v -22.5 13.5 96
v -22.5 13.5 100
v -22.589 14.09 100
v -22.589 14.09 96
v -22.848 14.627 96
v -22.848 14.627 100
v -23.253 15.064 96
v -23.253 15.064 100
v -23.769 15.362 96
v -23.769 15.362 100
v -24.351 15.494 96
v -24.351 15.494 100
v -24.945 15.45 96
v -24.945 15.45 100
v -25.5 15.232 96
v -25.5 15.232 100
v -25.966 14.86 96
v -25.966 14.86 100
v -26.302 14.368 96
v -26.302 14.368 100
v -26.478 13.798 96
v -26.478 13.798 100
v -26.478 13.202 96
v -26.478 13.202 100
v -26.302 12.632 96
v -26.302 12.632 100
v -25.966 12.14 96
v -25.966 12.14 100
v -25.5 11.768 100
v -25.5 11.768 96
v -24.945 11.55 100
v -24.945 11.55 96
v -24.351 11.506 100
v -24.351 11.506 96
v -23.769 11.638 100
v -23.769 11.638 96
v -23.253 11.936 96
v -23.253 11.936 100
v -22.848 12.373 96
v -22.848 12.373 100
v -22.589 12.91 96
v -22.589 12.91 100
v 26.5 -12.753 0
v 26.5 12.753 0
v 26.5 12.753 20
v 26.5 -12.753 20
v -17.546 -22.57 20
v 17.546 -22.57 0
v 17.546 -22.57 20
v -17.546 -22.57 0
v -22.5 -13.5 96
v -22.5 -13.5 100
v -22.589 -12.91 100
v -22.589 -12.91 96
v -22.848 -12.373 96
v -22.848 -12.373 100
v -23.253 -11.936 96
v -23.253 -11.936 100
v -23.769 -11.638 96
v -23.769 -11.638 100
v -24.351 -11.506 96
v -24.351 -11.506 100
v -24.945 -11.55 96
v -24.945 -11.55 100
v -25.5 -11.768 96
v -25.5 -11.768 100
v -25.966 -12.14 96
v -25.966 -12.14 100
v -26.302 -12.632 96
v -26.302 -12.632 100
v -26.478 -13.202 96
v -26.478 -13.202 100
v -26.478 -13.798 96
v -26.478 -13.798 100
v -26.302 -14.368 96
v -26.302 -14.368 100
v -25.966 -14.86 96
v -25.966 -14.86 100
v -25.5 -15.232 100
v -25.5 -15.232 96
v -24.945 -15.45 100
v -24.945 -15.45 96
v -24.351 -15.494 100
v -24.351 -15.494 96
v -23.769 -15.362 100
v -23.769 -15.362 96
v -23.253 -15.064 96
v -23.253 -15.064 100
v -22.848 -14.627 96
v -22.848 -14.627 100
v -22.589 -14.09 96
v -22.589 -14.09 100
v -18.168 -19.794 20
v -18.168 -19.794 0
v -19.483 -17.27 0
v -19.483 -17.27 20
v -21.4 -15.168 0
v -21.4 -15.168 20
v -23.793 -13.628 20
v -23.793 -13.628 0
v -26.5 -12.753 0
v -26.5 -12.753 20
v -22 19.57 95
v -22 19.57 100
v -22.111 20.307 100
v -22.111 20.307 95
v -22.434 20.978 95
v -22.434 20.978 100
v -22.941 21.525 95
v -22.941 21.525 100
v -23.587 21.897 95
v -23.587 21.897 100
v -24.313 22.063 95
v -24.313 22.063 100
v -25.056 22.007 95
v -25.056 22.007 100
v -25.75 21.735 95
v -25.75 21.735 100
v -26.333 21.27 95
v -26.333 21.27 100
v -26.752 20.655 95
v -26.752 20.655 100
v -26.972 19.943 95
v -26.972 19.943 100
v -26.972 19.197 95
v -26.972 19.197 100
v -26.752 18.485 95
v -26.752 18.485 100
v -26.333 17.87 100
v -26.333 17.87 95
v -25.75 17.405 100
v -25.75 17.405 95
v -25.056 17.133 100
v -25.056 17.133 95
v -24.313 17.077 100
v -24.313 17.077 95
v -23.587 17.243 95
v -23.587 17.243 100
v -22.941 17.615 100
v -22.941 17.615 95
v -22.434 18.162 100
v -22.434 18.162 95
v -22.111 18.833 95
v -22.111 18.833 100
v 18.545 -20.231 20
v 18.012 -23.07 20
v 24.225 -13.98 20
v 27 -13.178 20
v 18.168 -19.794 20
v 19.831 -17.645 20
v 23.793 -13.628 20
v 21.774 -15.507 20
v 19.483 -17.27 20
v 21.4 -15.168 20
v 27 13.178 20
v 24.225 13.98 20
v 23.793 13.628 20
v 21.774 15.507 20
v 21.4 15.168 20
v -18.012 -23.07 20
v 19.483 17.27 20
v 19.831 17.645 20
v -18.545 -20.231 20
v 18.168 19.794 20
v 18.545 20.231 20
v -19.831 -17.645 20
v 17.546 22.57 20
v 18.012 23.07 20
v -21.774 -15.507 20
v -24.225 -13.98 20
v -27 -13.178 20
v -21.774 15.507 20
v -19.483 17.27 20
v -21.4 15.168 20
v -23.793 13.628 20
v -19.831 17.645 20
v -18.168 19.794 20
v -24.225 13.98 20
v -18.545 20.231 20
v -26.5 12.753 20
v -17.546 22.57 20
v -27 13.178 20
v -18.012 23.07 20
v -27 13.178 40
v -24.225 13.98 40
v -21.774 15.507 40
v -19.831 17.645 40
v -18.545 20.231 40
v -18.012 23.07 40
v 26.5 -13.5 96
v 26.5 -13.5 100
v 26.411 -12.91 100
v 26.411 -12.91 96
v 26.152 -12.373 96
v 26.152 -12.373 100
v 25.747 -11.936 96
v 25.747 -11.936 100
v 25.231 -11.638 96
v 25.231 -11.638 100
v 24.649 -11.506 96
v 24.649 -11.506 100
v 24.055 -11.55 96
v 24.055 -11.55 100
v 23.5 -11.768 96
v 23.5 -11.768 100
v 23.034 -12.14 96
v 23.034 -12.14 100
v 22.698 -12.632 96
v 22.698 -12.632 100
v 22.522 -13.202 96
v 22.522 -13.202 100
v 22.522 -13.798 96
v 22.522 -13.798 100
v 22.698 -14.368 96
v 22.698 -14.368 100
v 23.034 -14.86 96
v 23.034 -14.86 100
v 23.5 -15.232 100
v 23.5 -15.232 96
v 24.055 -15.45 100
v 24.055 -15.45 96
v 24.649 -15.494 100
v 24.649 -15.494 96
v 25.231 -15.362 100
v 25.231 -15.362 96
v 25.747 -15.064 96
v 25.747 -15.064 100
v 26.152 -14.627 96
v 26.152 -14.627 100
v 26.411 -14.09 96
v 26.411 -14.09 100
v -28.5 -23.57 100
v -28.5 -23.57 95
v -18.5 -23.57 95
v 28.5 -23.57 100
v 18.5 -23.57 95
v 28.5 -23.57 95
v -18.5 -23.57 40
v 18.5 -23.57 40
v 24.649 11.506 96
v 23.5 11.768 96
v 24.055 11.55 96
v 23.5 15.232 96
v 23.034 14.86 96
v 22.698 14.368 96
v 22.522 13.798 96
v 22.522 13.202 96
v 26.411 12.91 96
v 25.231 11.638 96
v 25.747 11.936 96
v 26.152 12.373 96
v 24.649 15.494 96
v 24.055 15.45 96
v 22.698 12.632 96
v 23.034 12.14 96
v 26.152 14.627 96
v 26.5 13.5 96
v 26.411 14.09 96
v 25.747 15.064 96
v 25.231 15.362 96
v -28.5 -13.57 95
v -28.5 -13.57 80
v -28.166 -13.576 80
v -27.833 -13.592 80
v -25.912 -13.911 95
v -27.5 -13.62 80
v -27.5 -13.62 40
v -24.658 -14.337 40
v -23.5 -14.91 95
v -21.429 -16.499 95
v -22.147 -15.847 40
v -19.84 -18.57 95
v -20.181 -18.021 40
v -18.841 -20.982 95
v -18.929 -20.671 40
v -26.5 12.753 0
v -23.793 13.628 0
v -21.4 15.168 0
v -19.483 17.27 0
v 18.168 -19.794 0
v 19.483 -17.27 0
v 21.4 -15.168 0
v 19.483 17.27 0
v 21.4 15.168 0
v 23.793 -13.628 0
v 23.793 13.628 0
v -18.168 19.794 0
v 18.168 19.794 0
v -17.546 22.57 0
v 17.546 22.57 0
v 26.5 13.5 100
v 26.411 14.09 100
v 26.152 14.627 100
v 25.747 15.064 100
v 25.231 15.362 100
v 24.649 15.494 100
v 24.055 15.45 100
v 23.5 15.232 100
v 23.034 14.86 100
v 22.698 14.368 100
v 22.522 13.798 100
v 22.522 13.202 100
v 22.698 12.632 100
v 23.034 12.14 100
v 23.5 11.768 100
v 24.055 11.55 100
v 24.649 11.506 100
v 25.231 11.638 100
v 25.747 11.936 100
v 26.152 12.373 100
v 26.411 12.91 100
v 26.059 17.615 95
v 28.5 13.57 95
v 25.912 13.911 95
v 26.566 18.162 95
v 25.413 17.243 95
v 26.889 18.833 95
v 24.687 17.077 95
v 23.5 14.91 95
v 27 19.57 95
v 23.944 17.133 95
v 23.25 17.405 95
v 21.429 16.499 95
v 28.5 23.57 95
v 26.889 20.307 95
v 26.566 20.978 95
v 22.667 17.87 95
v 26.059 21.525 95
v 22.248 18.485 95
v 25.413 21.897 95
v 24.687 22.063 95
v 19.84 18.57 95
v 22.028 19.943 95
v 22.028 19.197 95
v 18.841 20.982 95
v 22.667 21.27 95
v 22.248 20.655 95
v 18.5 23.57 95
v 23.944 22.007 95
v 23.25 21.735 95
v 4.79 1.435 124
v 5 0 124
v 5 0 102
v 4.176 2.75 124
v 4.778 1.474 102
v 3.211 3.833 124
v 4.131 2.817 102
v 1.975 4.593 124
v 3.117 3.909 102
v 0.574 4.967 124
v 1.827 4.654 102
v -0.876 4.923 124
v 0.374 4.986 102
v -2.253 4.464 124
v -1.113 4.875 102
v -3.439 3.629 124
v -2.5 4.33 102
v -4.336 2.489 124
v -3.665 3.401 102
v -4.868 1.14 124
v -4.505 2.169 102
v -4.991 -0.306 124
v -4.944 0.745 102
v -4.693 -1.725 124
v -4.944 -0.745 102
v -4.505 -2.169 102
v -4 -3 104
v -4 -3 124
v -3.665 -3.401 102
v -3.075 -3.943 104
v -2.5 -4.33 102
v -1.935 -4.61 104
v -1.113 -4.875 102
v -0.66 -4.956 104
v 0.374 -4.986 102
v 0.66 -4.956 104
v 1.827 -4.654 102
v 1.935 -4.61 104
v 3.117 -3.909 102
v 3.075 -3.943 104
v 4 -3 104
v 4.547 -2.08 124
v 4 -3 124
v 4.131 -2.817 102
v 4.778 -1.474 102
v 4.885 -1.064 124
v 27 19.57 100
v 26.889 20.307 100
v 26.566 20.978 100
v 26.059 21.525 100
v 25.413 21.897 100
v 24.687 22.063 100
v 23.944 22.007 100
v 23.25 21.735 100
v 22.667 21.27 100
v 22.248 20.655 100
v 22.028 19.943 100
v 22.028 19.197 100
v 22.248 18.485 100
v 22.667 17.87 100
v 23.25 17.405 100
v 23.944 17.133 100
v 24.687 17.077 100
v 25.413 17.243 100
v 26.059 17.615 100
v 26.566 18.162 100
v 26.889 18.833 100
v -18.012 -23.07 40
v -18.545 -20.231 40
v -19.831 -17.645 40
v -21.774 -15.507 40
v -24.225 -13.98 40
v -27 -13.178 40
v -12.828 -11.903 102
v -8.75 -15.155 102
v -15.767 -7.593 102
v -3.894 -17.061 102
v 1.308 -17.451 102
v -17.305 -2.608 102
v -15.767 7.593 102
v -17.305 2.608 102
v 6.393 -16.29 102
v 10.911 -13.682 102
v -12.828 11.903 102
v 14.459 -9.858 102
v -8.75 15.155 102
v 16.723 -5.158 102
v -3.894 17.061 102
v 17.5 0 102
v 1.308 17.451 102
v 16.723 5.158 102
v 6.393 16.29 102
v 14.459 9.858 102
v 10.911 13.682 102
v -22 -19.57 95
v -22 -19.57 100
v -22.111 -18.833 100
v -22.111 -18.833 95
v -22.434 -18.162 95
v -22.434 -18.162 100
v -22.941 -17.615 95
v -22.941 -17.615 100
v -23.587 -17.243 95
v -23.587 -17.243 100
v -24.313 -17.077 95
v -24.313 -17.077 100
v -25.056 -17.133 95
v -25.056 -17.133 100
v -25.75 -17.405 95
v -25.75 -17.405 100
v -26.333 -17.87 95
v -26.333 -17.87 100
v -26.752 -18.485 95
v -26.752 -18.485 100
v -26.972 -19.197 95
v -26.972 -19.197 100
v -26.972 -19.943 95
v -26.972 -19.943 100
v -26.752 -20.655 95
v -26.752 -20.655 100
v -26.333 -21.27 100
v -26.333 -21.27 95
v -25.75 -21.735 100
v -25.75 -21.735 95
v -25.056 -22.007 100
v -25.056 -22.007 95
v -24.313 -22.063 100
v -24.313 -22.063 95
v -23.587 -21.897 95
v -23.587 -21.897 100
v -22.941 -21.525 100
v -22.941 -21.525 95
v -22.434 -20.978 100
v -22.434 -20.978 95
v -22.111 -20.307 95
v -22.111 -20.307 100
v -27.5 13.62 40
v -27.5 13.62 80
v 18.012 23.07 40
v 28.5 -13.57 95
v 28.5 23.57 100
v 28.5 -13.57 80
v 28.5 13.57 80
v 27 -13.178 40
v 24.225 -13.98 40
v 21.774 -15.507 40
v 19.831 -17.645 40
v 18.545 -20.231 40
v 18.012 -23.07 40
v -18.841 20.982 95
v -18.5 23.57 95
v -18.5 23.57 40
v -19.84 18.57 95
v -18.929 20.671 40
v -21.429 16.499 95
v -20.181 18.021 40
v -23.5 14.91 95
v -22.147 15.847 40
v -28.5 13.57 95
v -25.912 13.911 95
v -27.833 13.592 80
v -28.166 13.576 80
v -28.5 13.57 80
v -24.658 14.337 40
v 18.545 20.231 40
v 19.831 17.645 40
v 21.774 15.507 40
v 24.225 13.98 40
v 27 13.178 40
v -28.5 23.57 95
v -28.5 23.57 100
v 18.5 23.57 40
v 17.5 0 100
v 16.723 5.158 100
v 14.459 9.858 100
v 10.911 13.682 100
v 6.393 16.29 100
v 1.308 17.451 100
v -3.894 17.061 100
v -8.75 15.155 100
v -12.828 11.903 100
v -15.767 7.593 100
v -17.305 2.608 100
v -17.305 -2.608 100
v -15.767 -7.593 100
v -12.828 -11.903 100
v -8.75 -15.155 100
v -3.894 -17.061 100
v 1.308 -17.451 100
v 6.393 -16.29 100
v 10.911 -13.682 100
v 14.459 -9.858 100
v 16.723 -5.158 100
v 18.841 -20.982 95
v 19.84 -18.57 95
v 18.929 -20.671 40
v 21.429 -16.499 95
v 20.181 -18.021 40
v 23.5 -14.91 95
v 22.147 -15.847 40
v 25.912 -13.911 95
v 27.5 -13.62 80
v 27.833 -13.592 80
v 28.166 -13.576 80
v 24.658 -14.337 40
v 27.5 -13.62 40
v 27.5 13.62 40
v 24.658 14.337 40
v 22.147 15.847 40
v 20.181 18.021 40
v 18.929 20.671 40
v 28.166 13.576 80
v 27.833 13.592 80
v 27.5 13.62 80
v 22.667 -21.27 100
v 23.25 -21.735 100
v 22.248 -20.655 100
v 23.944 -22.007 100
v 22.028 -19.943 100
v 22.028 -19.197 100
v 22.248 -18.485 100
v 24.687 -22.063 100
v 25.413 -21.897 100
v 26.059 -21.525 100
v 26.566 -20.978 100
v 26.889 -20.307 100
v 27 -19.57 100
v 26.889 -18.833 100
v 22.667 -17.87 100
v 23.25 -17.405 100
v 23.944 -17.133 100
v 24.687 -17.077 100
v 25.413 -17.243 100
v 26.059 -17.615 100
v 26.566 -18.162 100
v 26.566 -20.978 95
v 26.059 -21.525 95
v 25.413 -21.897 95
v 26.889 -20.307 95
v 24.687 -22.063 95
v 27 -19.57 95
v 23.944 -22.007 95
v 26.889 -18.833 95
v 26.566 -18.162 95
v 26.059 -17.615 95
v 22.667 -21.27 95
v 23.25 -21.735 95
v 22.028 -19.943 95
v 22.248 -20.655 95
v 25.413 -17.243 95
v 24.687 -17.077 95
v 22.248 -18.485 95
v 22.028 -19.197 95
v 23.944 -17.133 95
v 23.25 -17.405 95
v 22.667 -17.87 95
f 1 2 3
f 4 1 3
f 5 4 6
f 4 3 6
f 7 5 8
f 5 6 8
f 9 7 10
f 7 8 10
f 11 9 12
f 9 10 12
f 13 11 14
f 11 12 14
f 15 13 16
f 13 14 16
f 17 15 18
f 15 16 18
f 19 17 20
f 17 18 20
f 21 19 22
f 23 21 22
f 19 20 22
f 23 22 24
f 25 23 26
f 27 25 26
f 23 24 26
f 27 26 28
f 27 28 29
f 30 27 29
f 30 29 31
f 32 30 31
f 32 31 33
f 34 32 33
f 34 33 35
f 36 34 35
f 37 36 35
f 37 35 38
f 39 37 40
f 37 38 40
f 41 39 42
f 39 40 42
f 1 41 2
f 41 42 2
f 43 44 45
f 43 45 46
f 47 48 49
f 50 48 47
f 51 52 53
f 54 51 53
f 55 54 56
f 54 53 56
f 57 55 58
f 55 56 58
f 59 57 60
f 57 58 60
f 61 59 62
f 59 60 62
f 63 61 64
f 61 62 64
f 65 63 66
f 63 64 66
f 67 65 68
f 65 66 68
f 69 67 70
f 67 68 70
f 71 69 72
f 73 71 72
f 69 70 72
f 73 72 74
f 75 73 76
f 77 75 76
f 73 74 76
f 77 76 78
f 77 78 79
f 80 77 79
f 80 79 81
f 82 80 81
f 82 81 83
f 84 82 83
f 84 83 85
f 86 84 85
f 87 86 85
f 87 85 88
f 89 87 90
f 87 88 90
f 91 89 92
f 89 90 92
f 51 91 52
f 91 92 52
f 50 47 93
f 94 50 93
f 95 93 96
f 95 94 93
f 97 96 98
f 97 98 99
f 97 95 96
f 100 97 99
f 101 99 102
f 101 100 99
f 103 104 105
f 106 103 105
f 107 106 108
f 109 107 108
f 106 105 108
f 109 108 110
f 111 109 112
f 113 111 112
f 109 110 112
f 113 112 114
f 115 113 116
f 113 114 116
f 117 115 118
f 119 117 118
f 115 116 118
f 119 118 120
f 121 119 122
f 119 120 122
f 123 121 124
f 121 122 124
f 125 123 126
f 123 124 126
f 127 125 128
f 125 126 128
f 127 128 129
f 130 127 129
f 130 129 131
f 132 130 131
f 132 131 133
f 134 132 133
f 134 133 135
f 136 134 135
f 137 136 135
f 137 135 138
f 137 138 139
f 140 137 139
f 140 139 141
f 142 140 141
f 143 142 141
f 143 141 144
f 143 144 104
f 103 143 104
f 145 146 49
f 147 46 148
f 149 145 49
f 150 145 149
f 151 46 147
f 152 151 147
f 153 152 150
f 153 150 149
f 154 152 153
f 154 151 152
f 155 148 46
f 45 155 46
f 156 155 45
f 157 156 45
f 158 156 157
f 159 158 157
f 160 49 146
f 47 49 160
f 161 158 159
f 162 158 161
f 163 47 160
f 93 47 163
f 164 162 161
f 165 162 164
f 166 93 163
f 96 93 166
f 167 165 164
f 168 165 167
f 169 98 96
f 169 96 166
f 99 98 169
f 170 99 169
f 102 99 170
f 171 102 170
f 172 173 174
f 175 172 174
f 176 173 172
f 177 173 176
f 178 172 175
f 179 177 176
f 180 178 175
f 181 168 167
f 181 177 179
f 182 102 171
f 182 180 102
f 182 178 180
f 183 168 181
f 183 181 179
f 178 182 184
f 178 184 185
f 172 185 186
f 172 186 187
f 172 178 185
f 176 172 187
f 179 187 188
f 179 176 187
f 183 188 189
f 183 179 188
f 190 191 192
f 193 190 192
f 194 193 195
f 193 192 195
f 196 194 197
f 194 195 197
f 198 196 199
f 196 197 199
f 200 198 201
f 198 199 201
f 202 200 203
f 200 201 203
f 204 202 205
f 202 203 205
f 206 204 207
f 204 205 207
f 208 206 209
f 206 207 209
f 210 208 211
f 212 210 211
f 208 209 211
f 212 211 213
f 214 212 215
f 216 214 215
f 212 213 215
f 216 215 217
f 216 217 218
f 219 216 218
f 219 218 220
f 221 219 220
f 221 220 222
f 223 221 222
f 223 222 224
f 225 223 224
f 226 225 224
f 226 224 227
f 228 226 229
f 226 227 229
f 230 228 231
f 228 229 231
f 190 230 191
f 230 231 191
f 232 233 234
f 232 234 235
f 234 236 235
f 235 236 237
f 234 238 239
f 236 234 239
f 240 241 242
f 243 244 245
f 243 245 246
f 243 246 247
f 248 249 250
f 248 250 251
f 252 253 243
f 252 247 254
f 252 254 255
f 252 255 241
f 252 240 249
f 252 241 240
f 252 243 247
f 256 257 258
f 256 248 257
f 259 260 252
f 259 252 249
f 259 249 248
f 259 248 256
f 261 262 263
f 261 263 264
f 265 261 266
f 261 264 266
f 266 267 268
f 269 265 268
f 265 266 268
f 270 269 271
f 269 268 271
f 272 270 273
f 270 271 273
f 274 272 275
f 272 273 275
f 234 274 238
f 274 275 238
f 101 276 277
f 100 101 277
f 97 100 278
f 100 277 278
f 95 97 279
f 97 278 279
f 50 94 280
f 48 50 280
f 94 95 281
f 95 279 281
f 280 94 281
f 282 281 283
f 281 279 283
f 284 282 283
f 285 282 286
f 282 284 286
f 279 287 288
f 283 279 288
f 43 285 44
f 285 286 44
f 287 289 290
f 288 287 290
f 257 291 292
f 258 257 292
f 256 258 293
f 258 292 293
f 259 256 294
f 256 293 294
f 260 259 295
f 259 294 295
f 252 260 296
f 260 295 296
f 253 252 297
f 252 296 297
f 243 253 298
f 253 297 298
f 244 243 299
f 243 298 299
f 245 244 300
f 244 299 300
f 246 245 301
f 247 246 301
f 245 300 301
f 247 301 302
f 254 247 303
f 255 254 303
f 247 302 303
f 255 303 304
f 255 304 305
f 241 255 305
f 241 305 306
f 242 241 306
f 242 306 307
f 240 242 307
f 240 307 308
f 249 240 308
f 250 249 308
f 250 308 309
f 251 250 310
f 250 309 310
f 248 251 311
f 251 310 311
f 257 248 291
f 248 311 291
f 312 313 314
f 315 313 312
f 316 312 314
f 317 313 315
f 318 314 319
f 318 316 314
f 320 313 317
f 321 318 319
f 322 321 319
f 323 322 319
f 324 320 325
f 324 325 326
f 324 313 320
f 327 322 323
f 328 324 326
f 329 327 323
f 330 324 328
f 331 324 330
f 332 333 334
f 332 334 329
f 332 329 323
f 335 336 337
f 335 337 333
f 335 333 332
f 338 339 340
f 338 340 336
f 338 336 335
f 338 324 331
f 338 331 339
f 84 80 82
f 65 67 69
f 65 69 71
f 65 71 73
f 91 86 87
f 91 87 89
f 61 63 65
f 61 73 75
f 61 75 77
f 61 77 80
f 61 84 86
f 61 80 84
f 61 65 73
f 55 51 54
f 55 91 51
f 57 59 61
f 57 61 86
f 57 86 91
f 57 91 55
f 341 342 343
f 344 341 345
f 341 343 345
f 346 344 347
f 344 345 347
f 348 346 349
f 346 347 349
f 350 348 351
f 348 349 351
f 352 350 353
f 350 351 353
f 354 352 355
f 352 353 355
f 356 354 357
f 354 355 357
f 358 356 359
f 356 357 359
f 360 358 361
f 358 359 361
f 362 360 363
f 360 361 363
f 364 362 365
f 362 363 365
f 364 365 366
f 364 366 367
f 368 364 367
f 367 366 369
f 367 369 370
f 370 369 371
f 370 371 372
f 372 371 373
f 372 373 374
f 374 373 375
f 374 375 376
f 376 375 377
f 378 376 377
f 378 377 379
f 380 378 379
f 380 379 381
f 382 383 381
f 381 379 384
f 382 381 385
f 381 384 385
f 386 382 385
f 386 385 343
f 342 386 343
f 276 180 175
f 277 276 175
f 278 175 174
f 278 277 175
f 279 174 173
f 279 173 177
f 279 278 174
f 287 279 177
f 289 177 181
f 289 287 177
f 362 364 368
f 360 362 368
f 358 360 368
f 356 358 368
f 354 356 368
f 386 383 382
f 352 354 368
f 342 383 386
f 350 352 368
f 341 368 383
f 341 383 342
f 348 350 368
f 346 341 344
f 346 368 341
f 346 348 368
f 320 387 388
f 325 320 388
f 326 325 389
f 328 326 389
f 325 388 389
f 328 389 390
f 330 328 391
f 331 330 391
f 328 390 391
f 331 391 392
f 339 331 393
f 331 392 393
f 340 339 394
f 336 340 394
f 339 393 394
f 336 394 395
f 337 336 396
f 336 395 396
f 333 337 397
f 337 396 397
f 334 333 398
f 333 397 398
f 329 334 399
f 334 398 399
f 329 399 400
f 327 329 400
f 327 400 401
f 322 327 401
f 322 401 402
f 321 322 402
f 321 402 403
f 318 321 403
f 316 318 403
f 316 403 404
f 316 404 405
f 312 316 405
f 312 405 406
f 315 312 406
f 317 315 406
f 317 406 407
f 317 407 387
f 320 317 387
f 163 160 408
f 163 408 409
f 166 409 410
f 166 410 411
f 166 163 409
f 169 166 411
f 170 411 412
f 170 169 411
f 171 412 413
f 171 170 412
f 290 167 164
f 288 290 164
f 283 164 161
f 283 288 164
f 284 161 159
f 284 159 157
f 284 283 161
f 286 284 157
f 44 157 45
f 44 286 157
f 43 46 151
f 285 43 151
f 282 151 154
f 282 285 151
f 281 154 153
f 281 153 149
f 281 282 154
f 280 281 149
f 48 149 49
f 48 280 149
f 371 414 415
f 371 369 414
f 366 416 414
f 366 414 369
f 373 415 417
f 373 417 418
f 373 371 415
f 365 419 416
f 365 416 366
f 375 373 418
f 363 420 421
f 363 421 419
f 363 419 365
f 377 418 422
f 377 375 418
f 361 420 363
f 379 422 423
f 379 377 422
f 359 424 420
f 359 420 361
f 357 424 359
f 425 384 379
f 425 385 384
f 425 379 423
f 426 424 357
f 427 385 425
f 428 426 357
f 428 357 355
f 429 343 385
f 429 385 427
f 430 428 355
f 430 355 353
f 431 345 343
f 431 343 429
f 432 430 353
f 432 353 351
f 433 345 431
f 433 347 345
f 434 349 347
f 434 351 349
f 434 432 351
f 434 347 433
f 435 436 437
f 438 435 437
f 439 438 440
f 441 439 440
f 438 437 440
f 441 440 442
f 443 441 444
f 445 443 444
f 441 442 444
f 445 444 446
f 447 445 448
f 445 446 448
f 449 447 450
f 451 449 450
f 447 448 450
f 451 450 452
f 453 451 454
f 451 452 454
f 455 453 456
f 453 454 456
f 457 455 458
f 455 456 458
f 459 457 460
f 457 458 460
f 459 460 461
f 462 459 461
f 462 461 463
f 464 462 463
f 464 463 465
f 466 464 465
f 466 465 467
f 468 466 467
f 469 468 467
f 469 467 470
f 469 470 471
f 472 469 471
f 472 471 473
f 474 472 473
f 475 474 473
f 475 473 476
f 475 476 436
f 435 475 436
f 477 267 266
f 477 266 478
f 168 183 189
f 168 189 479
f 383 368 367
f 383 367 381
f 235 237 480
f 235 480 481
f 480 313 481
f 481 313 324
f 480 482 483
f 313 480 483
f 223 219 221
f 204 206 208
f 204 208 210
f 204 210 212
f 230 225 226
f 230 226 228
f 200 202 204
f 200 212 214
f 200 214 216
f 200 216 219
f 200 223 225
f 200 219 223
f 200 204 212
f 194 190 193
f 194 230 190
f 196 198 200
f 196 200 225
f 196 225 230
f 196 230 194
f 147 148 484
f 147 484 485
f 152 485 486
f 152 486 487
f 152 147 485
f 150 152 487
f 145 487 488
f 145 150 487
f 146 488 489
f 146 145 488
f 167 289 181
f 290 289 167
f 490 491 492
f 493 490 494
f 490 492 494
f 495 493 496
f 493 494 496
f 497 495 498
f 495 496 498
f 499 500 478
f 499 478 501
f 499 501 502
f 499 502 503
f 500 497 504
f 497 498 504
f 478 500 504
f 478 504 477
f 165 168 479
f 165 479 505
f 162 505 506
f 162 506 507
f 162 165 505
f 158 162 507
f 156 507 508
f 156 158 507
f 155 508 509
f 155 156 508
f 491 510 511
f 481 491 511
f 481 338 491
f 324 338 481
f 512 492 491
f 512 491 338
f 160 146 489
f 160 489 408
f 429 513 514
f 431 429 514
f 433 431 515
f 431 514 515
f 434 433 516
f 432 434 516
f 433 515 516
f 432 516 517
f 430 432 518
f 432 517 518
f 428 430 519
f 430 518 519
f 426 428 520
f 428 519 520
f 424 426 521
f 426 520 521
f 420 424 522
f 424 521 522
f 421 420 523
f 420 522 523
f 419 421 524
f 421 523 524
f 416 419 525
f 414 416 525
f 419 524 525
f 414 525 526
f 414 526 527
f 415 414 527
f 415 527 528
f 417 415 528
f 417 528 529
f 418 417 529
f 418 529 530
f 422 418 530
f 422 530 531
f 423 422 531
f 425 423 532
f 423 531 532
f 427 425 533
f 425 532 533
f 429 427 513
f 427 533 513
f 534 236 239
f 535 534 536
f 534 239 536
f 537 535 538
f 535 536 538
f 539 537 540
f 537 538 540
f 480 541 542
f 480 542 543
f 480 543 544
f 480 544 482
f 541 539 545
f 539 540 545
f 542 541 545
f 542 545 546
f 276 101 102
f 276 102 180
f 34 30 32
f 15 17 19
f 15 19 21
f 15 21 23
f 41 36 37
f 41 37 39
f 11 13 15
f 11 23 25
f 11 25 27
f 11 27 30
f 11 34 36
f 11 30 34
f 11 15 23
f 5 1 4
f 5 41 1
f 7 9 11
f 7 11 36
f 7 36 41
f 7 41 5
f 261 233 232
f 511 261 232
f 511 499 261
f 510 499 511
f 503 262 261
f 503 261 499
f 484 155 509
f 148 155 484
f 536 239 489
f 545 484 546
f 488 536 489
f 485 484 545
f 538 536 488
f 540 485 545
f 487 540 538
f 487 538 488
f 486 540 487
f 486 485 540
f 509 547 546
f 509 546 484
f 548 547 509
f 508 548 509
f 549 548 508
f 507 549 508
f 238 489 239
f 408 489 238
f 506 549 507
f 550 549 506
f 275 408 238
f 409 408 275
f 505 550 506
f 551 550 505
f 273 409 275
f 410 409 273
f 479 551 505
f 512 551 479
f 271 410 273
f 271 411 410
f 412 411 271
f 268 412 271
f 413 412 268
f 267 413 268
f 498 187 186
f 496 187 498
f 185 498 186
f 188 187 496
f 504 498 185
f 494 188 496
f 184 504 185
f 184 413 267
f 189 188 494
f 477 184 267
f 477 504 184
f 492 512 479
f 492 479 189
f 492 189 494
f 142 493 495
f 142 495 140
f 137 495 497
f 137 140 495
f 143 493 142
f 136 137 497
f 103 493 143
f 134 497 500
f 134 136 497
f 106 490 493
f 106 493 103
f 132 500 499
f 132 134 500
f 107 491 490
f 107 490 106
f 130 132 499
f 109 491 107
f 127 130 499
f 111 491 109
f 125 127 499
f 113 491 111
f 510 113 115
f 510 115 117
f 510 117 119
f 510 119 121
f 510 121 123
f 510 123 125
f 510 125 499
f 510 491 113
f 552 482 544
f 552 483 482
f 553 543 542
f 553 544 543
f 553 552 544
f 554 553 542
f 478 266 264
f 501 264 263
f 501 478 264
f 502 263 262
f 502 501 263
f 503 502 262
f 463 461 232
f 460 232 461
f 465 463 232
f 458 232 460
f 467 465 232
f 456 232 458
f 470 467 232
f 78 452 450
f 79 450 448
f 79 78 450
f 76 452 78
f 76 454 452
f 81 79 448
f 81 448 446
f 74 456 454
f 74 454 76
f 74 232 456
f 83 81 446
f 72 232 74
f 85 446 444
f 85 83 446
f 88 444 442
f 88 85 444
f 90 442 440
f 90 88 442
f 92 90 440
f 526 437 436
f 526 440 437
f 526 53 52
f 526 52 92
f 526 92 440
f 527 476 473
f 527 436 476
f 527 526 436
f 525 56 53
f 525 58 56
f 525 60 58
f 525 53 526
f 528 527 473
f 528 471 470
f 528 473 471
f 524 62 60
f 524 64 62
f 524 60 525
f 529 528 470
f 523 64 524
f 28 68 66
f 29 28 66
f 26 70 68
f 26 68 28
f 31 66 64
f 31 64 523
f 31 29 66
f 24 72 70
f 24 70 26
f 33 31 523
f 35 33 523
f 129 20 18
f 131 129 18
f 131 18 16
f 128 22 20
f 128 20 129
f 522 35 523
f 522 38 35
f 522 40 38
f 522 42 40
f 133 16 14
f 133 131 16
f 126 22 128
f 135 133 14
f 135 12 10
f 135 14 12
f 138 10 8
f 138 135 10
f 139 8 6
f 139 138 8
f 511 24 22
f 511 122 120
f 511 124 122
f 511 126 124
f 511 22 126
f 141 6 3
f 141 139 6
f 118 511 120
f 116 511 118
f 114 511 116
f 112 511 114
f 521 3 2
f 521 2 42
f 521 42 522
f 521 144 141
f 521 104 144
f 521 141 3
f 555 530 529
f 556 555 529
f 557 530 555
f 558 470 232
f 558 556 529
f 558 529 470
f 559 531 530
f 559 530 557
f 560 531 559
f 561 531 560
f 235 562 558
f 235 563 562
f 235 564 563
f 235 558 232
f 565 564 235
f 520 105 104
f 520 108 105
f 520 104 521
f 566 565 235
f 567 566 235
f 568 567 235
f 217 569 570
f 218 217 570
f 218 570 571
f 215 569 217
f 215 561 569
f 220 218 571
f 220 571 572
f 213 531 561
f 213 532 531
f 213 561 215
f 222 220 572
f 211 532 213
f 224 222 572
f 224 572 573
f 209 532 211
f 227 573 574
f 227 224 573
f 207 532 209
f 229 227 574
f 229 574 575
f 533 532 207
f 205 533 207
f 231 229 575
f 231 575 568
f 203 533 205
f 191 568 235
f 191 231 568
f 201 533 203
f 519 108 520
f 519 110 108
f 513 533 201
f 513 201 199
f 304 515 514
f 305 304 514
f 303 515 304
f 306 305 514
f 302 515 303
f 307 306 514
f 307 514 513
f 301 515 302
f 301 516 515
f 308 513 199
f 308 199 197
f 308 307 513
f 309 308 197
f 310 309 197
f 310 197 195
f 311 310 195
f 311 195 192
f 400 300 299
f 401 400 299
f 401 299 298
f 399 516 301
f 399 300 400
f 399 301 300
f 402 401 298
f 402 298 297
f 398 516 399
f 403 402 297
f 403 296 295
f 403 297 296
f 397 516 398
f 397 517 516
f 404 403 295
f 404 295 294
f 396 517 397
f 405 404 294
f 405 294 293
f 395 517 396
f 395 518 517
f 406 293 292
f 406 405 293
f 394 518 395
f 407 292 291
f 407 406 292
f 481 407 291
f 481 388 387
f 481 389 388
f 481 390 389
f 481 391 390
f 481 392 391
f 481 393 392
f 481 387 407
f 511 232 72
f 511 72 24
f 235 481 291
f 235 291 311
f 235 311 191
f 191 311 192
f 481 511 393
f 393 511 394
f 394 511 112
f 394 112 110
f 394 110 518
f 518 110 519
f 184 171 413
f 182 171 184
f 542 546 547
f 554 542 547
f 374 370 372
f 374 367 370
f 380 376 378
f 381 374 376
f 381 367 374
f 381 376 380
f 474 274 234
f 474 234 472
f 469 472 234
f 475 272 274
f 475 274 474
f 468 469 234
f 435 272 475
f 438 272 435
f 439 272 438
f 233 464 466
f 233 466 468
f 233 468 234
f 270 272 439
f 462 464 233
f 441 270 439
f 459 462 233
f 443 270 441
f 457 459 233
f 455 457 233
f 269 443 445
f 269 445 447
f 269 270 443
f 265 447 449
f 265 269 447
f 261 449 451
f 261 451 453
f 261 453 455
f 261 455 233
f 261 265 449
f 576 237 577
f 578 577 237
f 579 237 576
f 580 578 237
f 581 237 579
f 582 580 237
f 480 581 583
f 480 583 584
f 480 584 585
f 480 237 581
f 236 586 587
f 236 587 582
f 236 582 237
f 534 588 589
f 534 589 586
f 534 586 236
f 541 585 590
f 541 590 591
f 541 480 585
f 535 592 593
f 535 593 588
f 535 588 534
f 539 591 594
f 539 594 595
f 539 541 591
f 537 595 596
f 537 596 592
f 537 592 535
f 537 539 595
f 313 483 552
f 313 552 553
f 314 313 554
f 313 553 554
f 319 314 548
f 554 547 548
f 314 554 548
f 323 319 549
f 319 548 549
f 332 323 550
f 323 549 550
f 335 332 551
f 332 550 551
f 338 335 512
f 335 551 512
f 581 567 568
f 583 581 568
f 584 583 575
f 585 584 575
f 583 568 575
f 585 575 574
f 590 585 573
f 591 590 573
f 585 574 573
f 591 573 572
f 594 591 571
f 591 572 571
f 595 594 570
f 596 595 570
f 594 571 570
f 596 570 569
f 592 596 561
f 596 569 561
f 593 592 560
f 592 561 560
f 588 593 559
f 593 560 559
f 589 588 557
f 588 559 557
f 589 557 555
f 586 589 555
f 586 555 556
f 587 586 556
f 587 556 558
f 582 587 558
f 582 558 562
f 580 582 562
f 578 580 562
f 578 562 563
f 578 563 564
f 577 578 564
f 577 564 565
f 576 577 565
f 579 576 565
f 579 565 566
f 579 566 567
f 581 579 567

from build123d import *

# Parameters (mm, degrees)
SKETCH_2_W           = 57
SKETCH_2_H           = 47.14
EXTRUDE_1_DEPTH      = 100
SKETCH_3_R           = 17.5
EXTRUDE_2_DEPTH      = 2
SKETCH_4_R           = 5
EXTRUDE_3_DEPTH      = 22
SKETCH_5_W           = 15.396782634
SKETCH_5_H           = 5.477116352
CUT_EXTRUDE_1_DEPTH  = 20
SKETCH_7_R           = 10
CUT_EXTRUDE_2_DEPTH  = 95
SKETCH_8_R           = 2.5
CUT_EXTRUDE_3_DEPTH  = 90
SKETCH_9_OUTSIDE_W   = 87.878
SKETCH_9_OUTSIDE_H   = 78.018
SKETCH_9_OUTSIDE_W_2 = 55
SKETCH_9_OUTSIDE_H_2 = 47.14
CUT_EXTRUDE_4_DEPTH  = 80
CUT_EXTRUDE_5_DEPTH  = 40
CUT_EXTRUDE_6_DEPTH  = 20
SKETCH_12_R          = 2
CUT_EXTRUDE_7_DEPTH  = 4


with BuildPart() as part:
    # 草图2 → 凸台-拉伸1 (new body)
    with BuildSketch(Plane.XY):
        Rectangle(SKETCH_2_W, SKETCH_2_H)
    extrude(amount=EXTRUDE_1_DEPTH)

    # 草图3 → 凸台-拉伸2 (add)
    with BuildSketch(Plane.XY.offset(100)):
        Circle(SKETCH_3_R)
    extrude(amount=EXTRUDE_2_DEPTH)

    # 草图4 → 凸台-拉伸3 (add)
    with BuildSketch(Plane.XY.offset(102)):
        Circle(SKETCH_4_R)
    extrude(amount=EXTRUDE_3_DEPTH)

    # 草图5 → 切除-拉伸1 (cut)
    with BuildSketch(Plane.XY.offset(124)):
        with Locations((0.517283211, -5.738558176)):
            Rectangle(SKETCH_5_W, SKETCH_5_H)
    extrude(amount=-CUT_EXTRUDE_1_DEPTH, mode=Mode.SUBTRACT)

    # 草图7 → 切除-拉伸2 (cut)
    with BuildSketch(Plane(origin=(0, 0, 0), x_dir=(-1, 0, 0), z_dir=(0, 0, -1))):
        with Locations((28.5, 23.57)):
            Circle(SKETCH_7_R)
        with Locations((28.5, -23.57)):
            Circle(SKETCH_7_R)
        with Locations((-28.5, -23.57)):
            Circle(SKETCH_7_R)
        with Locations((-28.5, 23.57)):
            Circle(SKETCH_7_R)
    extrude(amount=-CUT_EXTRUDE_2_DEPTH, mode=Mode.SUBTRACT)

    # 草图8 → 切除-拉伸3 (cut)
    with BuildSketch(Plane.XY.offset(100)):
        with Locations((-24.5, 19.57)):
            Circle(SKETCH_8_R)
        with Locations((24.5, 19.57)):
            Circle(SKETCH_8_R)
        with Locations((24.5, -19.57)):
            Circle(SKETCH_8_R)
        with Locations((-24.5, -19.57)):
            Circle(SKETCH_8_R)
    extrude(amount=-CUT_EXTRUDE_3_DEPTH, mode=Mode.SUBTRACT)

    # 草图9 outside → 切除-拉伸4 (cut)
    with BuildSketch(Plane(origin=(0, 0, 0), x_dir=(-1, 0, 0), z_dir=(0, 0, -1))):
        Rectangle(SKETCH_9_OUTSIDE_W, SKETCH_9_OUTSIDE_H)
        Rectangle(SKETCH_9_OUTSIDE_W_2, SKETCH_9_OUTSIDE_H_2, mode=Mode.SUBTRACT)
    extrude(amount=-CUT_EXTRUDE_4_DEPTH, mode=Mode.SUBTRACT)

    # 草图10 → 切除-拉伸5 (cut)
    with BuildSketch(Plane(origin=(0, 0, 0), x_dir=(-1, 0, 0), z_dir=(0, 0, -1))):
        with BuildLine():
            Line((-27.5, 13.620125629), (-27.5, -13.620125629))
            ThreePointArc((-27.5, -13.620125629), (-21.083801513, -16.861796068), (-18.5, -23.57))
            Line((-18.5, -23.57), (18.5, -23.57))
            ThreePointArc((18.5, -23.57), (21.083801513, -16.861796068), (27.5, -13.620125629))
            Line((27.5, -13.620125629), (27.5, 13.620125629))
            ThreePointArc((27.5, 13.620125629), (21.083801513, 16.861796068), (18.5, 23.57))
            Line((18.5, 23.57), (-18.5, 23.57))
            ThreePointArc((-18.5, 23.57), (-21.083801513, 16.861796068), (-27.5, 13.620125629))
        make_face()
        with BuildLine():
            Line((-27, 13.177695155), (-27, -13.177695155))
            ThreePointArc((-27, -13.177695155), (-20.728707305, -16.509050358), (-18.011911518, -23.07))
            Line((-18.011911518, -23.07), (18.011911518, -23.07))
            ThreePointArc((18.011911518, -23.07), (20.728707305, -16.509050358), (27, -13.177695155))
            Line((27, -13.177695155), (27, 13.177695155))
            ThreePointArc((27, 13.177695155), (20.728707305, 16.509050358), (18.011911518, 23.07))
            Line((18.011911518, 23.07), (-18.011911518, 23.07))
            ThreePointArc((-18.011911518, 23.07), (-20.728707305, 16.509050358), (-27, 13.177695155))
        make_face(mode=Mode.SUBTRACT)
    extrude(amount=-CUT_EXTRUDE_5_DEPTH, mode=Mode.SUBTRACT)

    # 草图11 → 切除-拉伸6 (cut)
    with BuildSketch(Plane(origin=(0, 0, 0), x_dir=(-1, 0, 0), z_dir=(0, 0, -1))):
        with BuildLine():
            Line((-27, 13.177695155), (-27, -13.177695155))
            ThreePointArc((-27, -13.177695155), (-20.728707305, -16.509050358), (-18.011911518, -23.07))
            Line((-18.011911518, -23.07), (18.011911518, -23.07))
            ThreePointArc((18.011911518, -23.07), (20.728707305, -16.509050358), (27, -13.177695155))
            Line((27, -13.177695155), (27, 13.177695155))
            ThreePointArc((27, 13.177695155), (20.728707305, 16.509050358), (18.011911518, 23.07))
            Line((18.011911518, 23.07), (-18.011911518, 23.07))
            ThreePointArc((-18.011911518, 23.07), (-20.728707305, 16.509050358), (-27, 13.177695155))
        make_face()
        with BuildLine():
            Line((17.54554885, 22.57), (-17.54554885, 22.57))
            ThreePointArc((-17.54554885, 22.57), (-20.373123341, 16.156911861), (-26.5, 12.753346174))
            Line((-26.5, 12.753346174), (-26.5, -12.753346174))
            ThreePointArc((-26.5, -12.753346174), (-20.373123341, -16.156911861), (-17.54554885, -22.57))
            Line((-17.54554885, -22.57), (17.54554885, -22.57))
            ThreePointArc((17.54554885, -22.57), (20.373123341, -16.156911861), (26.5, -12.753346174))
            Line((26.5, -12.753346174), (26.5, 12.753346174))
            ThreePointArc((26.5, 12.753346174), (20.373123341, 16.156911861), (17.54554885, 22.57))
        make_face(mode=Mode.SUBTRACT)
    extrude(amount=-CUT_EXTRUDE_6_DEPTH, mode=Mode.SUBTRACT)

    # 草图12 → 切除-拉伸7 (cut)
    with BuildSketch(Plane.XY.offset(100)):
        with Locations((-24.5, 13.5)):
            Circle(SKETCH_12_R)
        with Locations((-24.5, -13.5)):
            Circle(SKETCH_12_R)
        with Locations((24.5, -13.5)):
            Circle(SKETCH_12_R)
        with Locations((24.5, 13.5)):
            Circle(SKETCH_12_R)
    extrude(amount=-CUT_EXTRUDE_7_DEPTH, mode=Mode.SUBTRACT)


solid = part.part
